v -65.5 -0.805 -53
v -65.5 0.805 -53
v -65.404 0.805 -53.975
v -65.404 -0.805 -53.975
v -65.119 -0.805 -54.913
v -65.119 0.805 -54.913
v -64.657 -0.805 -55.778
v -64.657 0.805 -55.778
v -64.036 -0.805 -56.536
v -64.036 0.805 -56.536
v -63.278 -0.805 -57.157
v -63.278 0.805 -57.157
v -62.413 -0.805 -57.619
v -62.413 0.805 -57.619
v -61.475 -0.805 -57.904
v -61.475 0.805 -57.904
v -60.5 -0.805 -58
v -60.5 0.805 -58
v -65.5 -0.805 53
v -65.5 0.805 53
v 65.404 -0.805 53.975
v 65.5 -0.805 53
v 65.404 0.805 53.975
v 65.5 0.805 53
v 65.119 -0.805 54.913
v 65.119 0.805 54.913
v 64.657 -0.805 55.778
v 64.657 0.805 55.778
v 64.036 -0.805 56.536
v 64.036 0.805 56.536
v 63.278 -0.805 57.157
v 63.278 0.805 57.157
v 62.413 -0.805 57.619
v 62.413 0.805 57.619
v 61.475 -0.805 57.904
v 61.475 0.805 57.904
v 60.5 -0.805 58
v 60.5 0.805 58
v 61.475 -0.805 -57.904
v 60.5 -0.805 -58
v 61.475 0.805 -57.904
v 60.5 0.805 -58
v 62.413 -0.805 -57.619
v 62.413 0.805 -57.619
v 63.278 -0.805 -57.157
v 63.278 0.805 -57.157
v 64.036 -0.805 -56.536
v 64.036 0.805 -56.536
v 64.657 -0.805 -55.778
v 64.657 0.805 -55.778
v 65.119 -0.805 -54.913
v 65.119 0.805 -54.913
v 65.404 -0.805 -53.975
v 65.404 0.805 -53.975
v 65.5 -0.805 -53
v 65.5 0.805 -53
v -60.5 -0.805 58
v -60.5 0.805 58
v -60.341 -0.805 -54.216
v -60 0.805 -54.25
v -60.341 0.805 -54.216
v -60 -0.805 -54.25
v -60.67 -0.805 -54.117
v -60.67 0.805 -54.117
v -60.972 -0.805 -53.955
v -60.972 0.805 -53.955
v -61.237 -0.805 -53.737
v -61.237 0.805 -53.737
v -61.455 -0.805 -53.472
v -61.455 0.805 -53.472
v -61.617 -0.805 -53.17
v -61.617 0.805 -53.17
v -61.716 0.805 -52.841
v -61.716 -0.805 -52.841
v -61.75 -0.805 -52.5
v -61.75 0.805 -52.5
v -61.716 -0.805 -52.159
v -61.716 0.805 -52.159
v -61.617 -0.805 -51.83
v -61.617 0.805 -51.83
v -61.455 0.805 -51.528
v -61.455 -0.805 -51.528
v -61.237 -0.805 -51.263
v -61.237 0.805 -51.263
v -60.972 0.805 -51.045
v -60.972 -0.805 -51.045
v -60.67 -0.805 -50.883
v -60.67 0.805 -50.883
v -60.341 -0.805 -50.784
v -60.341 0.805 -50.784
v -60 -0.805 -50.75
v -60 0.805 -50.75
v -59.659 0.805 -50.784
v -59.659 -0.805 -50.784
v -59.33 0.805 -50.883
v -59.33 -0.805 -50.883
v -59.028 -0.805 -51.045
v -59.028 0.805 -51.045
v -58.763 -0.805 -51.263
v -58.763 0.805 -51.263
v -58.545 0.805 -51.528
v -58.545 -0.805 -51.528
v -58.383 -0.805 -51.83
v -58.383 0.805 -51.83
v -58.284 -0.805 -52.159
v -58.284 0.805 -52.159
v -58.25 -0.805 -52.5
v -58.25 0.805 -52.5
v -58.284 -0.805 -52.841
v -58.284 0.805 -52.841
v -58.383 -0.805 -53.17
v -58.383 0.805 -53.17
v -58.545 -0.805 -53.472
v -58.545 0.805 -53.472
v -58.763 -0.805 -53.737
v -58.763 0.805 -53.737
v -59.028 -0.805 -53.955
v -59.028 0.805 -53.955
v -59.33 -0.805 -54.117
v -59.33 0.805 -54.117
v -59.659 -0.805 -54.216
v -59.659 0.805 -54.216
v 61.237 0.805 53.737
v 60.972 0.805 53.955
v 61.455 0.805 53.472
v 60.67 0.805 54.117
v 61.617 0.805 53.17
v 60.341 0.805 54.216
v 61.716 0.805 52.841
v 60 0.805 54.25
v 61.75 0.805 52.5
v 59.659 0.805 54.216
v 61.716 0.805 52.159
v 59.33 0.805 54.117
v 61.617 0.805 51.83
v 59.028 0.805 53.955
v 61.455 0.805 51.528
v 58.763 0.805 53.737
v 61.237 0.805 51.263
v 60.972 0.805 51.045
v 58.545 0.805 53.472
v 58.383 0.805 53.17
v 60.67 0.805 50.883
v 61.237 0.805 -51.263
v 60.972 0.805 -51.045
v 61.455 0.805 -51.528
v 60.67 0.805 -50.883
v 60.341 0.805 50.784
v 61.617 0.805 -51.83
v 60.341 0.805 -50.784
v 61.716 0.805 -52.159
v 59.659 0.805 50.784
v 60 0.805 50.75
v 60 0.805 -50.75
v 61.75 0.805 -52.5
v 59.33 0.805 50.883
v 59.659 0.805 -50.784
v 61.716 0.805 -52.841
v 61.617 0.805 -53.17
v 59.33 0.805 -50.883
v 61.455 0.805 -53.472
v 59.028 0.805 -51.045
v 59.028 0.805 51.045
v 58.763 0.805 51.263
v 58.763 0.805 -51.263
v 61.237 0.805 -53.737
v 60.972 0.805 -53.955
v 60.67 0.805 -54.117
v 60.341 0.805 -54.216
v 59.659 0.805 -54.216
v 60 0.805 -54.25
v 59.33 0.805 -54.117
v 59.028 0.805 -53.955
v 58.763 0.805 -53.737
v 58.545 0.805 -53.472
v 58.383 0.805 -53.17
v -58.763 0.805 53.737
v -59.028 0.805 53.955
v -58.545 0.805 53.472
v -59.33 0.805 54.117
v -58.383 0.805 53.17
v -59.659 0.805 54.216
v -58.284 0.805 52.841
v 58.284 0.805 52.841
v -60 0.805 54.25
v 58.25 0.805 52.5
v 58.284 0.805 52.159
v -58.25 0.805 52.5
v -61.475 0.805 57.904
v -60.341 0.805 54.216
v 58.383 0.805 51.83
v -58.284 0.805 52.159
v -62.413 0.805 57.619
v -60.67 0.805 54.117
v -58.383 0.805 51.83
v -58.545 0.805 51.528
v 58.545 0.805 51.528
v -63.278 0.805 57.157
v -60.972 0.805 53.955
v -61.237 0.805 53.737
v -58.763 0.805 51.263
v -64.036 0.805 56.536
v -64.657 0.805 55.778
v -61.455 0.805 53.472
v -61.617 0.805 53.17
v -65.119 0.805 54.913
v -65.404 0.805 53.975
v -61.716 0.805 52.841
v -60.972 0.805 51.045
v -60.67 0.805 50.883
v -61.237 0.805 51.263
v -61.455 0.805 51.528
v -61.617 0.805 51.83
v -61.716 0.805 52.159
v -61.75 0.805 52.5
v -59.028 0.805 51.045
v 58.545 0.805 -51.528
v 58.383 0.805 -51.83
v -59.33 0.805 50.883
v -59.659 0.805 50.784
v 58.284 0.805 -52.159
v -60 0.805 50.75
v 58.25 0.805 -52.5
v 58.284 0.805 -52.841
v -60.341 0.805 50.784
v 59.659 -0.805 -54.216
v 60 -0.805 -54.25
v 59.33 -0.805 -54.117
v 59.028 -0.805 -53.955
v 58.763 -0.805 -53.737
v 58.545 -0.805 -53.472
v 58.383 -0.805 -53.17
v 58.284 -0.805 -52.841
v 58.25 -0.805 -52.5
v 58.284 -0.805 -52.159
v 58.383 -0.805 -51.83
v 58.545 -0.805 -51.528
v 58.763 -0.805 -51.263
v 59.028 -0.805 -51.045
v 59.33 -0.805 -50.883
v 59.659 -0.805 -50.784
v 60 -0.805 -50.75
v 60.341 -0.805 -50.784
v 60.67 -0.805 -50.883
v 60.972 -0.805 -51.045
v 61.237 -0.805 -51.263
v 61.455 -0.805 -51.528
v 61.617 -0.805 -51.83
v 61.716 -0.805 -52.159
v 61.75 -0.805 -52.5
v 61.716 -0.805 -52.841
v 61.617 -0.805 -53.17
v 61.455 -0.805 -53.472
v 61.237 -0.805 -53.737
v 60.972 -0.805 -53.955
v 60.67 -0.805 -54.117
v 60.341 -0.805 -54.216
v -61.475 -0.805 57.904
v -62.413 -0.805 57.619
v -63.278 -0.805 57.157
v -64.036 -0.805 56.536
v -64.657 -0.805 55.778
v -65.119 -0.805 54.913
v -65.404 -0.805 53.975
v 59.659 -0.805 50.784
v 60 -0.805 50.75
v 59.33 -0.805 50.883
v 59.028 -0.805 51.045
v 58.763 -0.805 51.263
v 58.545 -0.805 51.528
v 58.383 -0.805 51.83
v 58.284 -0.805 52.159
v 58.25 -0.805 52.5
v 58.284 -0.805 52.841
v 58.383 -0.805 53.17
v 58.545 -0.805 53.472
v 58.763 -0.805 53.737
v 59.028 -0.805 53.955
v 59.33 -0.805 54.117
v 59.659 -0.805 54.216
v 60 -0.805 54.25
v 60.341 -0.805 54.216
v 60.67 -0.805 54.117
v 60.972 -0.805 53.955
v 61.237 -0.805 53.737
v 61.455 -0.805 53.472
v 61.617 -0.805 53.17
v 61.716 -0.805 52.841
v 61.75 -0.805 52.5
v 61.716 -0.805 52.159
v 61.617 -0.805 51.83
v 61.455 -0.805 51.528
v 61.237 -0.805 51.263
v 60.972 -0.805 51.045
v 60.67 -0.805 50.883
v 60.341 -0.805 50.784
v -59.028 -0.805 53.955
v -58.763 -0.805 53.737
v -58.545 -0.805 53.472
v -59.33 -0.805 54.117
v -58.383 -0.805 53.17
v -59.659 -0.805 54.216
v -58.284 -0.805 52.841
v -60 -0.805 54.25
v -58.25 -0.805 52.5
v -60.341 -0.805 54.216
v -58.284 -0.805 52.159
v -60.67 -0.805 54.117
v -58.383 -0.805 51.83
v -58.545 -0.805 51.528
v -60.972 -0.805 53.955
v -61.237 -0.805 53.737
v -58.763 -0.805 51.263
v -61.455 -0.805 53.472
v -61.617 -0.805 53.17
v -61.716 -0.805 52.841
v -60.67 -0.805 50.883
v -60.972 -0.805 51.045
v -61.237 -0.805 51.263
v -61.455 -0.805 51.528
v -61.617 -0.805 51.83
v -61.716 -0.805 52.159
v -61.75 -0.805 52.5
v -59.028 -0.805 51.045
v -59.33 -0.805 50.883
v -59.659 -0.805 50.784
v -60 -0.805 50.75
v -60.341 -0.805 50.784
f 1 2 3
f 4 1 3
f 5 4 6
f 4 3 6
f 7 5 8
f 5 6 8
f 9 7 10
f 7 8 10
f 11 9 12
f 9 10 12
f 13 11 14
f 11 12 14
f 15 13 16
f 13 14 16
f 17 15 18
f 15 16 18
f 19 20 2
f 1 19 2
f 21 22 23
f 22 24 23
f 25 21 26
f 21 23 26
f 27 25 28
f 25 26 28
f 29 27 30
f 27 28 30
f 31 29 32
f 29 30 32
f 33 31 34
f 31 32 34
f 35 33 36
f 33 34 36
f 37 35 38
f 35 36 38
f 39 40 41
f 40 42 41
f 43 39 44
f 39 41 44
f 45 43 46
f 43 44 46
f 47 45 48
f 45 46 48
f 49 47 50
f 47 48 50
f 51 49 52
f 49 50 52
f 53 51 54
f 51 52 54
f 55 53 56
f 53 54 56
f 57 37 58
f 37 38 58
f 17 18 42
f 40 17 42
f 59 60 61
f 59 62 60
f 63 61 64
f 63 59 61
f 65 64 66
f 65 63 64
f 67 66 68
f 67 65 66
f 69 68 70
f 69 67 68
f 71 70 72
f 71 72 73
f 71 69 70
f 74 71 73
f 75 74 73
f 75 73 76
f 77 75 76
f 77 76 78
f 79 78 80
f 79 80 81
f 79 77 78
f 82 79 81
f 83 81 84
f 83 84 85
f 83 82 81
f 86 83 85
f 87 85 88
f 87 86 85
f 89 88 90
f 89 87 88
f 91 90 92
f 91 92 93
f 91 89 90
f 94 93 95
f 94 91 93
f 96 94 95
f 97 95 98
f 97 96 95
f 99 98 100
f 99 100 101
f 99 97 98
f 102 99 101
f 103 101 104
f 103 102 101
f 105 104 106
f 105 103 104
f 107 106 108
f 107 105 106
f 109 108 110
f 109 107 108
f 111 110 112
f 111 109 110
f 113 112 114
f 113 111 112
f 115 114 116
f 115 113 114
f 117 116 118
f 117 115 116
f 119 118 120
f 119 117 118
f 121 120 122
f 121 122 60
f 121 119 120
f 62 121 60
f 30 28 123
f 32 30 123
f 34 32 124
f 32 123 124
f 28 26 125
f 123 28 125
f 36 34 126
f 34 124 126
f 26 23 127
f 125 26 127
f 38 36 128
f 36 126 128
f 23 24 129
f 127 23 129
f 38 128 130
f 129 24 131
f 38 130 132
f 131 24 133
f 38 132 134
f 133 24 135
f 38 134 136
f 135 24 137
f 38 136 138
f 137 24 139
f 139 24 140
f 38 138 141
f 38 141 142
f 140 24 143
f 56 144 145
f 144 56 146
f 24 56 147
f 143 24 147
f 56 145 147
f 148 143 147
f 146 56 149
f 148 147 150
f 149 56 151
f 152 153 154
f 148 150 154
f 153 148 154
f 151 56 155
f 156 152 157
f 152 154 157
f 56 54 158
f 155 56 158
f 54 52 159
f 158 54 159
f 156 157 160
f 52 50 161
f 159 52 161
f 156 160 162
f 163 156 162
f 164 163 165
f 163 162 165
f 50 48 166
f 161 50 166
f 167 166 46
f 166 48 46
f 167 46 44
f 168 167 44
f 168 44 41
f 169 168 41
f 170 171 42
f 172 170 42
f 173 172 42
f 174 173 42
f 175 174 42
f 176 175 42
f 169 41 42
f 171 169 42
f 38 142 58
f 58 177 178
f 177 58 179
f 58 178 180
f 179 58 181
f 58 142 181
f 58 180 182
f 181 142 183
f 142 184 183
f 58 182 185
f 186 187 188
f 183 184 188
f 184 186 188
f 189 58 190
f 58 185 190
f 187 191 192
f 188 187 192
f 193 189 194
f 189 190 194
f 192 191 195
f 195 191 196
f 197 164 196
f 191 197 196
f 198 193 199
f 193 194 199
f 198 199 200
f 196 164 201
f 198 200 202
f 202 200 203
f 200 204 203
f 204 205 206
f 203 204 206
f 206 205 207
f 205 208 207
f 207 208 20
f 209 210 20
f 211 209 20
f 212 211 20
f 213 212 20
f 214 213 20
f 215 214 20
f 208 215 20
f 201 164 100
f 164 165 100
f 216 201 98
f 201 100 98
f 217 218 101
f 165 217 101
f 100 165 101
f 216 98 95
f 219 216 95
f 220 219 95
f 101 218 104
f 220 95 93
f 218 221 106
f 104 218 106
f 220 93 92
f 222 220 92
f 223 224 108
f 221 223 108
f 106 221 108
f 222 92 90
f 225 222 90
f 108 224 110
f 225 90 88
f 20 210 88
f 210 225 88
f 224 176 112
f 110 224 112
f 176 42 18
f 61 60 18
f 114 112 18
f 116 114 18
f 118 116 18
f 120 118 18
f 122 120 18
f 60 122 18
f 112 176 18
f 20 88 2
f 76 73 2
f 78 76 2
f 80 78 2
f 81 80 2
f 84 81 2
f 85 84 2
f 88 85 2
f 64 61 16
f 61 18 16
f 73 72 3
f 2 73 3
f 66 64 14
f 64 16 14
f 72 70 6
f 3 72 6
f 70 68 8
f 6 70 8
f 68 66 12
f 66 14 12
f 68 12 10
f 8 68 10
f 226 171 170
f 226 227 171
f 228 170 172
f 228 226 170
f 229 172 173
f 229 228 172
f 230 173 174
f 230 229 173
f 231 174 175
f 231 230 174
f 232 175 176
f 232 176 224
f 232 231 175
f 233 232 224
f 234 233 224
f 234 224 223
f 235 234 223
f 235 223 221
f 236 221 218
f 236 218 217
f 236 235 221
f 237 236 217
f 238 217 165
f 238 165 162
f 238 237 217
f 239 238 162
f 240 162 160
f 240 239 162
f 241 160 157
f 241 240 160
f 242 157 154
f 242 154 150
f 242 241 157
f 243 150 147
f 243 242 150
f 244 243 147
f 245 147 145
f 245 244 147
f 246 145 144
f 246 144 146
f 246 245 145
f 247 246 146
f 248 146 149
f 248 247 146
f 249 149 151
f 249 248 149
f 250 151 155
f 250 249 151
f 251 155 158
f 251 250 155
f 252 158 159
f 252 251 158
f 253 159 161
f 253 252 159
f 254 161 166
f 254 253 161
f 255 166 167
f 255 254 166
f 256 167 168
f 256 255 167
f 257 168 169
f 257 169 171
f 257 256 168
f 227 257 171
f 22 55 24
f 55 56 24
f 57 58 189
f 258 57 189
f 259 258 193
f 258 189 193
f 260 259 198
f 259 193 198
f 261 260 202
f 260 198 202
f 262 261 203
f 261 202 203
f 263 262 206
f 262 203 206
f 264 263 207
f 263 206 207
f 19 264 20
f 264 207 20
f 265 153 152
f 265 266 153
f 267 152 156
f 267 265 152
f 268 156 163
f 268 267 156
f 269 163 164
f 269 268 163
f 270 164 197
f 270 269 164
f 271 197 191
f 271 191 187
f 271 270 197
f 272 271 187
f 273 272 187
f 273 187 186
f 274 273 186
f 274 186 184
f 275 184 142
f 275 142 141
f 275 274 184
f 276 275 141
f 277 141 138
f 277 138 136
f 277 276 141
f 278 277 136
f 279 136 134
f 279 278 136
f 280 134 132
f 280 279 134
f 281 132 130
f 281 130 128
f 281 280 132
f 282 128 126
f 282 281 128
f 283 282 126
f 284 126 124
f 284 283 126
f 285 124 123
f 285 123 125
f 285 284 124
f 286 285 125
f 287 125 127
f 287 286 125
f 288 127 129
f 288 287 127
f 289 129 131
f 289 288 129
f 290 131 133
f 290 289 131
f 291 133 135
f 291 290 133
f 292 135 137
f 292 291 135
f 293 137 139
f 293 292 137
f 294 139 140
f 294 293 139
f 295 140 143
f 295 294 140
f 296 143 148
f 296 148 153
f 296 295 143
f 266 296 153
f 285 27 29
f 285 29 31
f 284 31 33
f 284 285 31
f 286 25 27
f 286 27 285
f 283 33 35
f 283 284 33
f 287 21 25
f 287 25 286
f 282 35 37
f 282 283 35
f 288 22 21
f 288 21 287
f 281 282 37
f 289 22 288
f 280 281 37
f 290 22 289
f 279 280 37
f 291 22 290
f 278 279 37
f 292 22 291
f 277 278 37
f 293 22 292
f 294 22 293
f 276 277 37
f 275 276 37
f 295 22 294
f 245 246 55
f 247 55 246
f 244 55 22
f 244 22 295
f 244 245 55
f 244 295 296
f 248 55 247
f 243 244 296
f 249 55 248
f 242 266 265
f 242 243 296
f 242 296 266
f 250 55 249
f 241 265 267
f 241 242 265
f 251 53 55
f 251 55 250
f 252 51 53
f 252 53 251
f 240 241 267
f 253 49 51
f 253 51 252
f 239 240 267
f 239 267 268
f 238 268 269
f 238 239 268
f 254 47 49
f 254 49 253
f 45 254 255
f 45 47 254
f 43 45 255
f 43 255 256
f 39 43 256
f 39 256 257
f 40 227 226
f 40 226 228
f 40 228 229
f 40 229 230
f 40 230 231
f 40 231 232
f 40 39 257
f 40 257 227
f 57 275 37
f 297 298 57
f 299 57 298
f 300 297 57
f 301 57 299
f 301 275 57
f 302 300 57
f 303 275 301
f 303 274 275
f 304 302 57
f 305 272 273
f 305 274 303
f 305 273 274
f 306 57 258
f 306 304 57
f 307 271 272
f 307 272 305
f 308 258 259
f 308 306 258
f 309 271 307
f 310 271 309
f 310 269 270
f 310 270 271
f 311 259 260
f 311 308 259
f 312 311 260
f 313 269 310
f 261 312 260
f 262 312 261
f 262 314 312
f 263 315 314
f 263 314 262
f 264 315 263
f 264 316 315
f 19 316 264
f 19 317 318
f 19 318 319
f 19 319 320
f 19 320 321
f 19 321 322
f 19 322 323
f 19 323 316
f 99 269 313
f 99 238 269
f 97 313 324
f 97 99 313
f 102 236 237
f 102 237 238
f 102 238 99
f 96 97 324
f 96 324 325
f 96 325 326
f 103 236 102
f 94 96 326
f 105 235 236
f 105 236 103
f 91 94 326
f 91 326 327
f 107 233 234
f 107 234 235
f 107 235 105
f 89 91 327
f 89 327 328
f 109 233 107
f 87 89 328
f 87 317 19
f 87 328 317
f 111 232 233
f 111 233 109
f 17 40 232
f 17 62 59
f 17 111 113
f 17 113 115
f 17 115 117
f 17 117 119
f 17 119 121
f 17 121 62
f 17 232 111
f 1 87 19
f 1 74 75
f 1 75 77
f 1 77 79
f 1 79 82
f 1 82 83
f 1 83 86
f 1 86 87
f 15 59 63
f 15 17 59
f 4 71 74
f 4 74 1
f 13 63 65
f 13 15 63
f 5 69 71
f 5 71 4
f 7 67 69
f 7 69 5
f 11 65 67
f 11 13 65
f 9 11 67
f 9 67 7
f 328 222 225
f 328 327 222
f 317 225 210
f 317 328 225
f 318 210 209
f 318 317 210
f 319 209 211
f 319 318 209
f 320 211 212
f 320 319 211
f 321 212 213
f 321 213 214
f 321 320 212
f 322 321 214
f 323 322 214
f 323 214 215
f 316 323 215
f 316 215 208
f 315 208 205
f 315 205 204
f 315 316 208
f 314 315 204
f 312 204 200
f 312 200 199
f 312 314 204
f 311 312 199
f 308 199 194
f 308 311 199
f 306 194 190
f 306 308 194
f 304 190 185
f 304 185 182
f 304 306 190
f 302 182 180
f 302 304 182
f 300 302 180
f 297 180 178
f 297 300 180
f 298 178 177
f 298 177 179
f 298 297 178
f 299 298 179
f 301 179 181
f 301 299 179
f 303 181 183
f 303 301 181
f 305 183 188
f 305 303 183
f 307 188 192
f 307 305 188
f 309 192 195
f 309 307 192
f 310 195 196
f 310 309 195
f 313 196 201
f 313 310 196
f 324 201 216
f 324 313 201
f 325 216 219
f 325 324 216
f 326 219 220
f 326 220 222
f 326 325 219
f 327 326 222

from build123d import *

# Parameters (mm, degrees)
ESQUISSE1_R        = 1.75
BOSS_EXTRU_1_DEPTH = 0.805


with BuildPart() as part:
    # Esquisse1 → Boss.-Extru.1 (new, symmetric)
    with BuildSketch(Plane(origin=(0, 0, 0), x_dir=(1, 0, 0), z_dir=(0, 1, 0))):
        with BuildLine():
            Line((-60.5, 58), (60.5, 58))
            ThreePointArc((60.5, 58), (64.035533906, 56.535533906), (65.5, 53))
            Line((65.5, 53), (65.5, -53))
            ThreePointArc((65.5, -53), (64.035533906, -56.535533906), (60.5, -58))
            Line((60.5, -58), (-60.5, -58))
            ThreePointArc((-60.5, -58), (-64.035533906, -56.535533906), (-65.5, -53))
            Line((-65.5, -53), (-65.5, 53))
            ThreePointArc((-65.5, 53), (-64.035533906, 56.535533906), (-60.5, 58))
        make_face()
        with Locations(Location((-60, 52.5, 0), (0, 0, 90))):
            Circle(ESQUISSE1_R, mode=Mode.SUBTRACT)
        with Locations(Location((60, 52.5, 0), (0, 0, 90))):
            Circle(ESQUISSE1_R, mode=Mode.SUBTRACT)
        with Locations(Location((60, -52.5, 0), (0, 0, 90))):
            Circle(ESQUISSE1_R, mode=Mode.SUBTRACT)
        with Locations(Location((-60, -52.5, 0), (0, 0, 90))):
            Circle(ESQUISSE1_R, mode=Mode.SUBTRACT)
    extrude(amount=BOSS_EXTRU_1_DEPTH, both=True)


solid = part.part
